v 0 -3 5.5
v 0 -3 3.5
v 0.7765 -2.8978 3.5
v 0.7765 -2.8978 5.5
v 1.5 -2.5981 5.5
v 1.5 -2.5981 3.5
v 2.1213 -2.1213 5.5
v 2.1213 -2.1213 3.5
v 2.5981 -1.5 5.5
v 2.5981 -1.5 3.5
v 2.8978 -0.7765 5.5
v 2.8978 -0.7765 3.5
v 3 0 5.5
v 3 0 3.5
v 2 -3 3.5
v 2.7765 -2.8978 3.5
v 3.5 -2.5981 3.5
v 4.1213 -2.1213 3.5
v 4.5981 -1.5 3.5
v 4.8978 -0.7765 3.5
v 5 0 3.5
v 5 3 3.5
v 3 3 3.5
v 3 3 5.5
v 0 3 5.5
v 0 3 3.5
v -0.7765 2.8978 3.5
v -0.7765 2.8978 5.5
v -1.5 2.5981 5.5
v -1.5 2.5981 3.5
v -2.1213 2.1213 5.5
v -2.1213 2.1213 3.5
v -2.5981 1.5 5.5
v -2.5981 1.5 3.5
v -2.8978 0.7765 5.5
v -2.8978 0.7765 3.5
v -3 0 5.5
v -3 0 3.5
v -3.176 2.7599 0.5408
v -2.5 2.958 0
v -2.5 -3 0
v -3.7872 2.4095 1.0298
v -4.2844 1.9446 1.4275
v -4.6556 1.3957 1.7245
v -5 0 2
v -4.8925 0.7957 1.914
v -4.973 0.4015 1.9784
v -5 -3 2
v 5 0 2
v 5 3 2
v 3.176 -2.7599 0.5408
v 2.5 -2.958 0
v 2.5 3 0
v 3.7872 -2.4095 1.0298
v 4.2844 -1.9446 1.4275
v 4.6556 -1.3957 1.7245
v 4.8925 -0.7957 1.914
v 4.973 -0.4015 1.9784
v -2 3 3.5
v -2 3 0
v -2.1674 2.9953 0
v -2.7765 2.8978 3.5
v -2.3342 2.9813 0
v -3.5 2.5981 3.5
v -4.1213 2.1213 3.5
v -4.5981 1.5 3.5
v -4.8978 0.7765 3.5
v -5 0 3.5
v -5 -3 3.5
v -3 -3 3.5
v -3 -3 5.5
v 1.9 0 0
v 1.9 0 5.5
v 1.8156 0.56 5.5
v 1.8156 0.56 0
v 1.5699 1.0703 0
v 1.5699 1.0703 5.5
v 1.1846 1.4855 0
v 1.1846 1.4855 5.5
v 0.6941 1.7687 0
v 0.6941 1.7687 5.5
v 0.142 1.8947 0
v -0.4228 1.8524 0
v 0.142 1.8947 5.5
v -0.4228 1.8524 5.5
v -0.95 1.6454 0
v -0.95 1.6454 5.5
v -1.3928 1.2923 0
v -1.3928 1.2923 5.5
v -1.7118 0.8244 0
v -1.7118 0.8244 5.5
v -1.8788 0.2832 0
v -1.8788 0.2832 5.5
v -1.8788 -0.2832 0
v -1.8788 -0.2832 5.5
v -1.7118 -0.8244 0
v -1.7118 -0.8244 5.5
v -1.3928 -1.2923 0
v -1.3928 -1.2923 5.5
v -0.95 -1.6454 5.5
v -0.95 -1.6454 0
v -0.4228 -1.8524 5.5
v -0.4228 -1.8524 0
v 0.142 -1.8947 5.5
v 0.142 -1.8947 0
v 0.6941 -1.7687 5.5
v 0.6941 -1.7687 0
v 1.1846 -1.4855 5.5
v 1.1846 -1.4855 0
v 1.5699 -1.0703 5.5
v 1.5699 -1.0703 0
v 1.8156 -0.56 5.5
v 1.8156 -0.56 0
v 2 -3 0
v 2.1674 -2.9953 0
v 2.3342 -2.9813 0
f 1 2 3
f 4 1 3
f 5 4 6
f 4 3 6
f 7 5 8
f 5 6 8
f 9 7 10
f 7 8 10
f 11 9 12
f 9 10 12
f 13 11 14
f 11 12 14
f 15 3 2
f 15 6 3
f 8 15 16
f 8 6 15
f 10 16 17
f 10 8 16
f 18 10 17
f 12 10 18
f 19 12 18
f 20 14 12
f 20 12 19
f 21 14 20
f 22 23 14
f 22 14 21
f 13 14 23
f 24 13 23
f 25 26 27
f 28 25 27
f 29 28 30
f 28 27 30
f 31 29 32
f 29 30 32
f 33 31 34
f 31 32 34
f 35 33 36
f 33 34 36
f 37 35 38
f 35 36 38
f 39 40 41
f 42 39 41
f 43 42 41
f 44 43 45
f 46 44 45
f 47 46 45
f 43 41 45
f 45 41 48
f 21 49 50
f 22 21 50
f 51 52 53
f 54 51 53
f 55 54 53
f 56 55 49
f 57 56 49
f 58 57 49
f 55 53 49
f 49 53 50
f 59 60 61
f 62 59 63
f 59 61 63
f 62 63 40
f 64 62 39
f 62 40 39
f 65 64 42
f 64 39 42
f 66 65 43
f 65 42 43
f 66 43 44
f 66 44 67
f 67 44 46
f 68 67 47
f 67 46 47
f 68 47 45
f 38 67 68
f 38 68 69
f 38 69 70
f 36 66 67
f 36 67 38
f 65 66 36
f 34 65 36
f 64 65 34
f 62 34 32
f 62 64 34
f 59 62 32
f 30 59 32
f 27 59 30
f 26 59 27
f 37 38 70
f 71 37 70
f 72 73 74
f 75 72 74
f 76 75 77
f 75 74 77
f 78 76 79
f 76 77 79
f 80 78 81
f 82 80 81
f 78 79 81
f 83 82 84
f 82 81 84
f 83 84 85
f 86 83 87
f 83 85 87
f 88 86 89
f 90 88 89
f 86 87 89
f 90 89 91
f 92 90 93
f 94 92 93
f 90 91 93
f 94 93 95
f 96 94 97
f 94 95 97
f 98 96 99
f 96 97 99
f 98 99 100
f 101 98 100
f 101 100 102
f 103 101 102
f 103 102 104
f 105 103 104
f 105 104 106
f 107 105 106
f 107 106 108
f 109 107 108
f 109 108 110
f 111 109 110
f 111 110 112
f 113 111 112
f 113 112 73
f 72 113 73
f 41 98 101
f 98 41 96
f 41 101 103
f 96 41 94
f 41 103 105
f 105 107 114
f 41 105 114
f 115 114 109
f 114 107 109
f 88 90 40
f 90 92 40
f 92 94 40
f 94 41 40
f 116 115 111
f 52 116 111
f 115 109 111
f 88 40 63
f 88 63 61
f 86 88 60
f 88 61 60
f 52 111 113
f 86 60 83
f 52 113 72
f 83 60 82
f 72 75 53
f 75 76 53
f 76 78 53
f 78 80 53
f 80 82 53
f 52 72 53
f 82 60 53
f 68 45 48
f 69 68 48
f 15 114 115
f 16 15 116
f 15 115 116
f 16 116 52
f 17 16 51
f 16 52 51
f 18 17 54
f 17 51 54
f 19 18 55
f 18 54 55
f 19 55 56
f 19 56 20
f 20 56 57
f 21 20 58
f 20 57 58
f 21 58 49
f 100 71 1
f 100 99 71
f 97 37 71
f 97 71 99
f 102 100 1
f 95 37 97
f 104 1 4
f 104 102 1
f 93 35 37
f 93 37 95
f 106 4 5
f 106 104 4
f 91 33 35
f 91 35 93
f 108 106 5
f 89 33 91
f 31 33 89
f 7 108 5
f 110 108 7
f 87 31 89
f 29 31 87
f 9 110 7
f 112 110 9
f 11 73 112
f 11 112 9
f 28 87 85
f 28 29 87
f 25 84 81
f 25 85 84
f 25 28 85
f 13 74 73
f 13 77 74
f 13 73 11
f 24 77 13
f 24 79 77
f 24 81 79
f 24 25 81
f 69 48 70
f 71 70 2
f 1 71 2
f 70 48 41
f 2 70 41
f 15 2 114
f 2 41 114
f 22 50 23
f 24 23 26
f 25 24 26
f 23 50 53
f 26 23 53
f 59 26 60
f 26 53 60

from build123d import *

# Parameters (mm, degrees)
F1_DEPTH = 3.5
F3_DEPTH = 2
F4_R     = 1.9
F5_DEPTH = 25
F7_DEPTH = 25
F9_DEPTH = 25


with BuildPart() as f1:
    # F0 (on Top) → F1 (new body)
    with BuildSketch(Plane.XY):
        with BuildLine():
            Line((-5, 0), (-5, -3))
            Line((-5, -3), (2, -3))
            ThreePointArc((2, -3), (4.12132, -2.12132), (5, 0))
            Line((5, 0), (5, 3))
            Line((5, 3), (-2, 3))
            ThreePointArc((-2, 3), (-4.12132, 2.12132), (-5, 0))
        make_face()
    extrude(amount=F1_DEPTH)

    # F2 (on face) → F3 (join)
    with BuildSketch(Plane.XY.offset(3.5)):
        with BuildLine():
            Line((3, 0), (3, 3))
            Line((3, 3), (0, 3))
            ThreePointArc((0, 3), (-2.12132, 2.12132), (-3, 0))
            Line((-3, 0), (-3, -3))
            Line((-3, -3), (0, -3))
            ThreePointArc((0, -3), (2.12132, -2.12132), (3, 0))
        make_face()
    extrude(amount=F3_DEPTH)

    # F4 (on face) → F5 (cut)
    with BuildSketch(Plane.XY.offset(5.5)):
        Circle(F4_R)
    extrude(amount=-F5_DEPTH, mode=Mode.SUBTRACT)

    # F6 (on face) → F7 (cut)
    with BuildSketch(Plane.XZ.offset(3)):
        Polygon((-2.5, 0), (-5, 2), (-5, 0), align=None)
    extrude(amount=-F7_DEPTH, mode=Mode.SUBTRACT)

    # F8 (on face) → F9 (cut)
    with BuildSketch(Plane(origin=(0, 3, 0), x_dir=(-1, 0, 0), z_dir=(0, 1, 0))):
        Polygon((-5, 0), (-2.5, 0), (-5, 2), align=None)
    extrude(amount=-F9_DEPTH, mode=Mode.SUBTRACT)


solid = f1.part
